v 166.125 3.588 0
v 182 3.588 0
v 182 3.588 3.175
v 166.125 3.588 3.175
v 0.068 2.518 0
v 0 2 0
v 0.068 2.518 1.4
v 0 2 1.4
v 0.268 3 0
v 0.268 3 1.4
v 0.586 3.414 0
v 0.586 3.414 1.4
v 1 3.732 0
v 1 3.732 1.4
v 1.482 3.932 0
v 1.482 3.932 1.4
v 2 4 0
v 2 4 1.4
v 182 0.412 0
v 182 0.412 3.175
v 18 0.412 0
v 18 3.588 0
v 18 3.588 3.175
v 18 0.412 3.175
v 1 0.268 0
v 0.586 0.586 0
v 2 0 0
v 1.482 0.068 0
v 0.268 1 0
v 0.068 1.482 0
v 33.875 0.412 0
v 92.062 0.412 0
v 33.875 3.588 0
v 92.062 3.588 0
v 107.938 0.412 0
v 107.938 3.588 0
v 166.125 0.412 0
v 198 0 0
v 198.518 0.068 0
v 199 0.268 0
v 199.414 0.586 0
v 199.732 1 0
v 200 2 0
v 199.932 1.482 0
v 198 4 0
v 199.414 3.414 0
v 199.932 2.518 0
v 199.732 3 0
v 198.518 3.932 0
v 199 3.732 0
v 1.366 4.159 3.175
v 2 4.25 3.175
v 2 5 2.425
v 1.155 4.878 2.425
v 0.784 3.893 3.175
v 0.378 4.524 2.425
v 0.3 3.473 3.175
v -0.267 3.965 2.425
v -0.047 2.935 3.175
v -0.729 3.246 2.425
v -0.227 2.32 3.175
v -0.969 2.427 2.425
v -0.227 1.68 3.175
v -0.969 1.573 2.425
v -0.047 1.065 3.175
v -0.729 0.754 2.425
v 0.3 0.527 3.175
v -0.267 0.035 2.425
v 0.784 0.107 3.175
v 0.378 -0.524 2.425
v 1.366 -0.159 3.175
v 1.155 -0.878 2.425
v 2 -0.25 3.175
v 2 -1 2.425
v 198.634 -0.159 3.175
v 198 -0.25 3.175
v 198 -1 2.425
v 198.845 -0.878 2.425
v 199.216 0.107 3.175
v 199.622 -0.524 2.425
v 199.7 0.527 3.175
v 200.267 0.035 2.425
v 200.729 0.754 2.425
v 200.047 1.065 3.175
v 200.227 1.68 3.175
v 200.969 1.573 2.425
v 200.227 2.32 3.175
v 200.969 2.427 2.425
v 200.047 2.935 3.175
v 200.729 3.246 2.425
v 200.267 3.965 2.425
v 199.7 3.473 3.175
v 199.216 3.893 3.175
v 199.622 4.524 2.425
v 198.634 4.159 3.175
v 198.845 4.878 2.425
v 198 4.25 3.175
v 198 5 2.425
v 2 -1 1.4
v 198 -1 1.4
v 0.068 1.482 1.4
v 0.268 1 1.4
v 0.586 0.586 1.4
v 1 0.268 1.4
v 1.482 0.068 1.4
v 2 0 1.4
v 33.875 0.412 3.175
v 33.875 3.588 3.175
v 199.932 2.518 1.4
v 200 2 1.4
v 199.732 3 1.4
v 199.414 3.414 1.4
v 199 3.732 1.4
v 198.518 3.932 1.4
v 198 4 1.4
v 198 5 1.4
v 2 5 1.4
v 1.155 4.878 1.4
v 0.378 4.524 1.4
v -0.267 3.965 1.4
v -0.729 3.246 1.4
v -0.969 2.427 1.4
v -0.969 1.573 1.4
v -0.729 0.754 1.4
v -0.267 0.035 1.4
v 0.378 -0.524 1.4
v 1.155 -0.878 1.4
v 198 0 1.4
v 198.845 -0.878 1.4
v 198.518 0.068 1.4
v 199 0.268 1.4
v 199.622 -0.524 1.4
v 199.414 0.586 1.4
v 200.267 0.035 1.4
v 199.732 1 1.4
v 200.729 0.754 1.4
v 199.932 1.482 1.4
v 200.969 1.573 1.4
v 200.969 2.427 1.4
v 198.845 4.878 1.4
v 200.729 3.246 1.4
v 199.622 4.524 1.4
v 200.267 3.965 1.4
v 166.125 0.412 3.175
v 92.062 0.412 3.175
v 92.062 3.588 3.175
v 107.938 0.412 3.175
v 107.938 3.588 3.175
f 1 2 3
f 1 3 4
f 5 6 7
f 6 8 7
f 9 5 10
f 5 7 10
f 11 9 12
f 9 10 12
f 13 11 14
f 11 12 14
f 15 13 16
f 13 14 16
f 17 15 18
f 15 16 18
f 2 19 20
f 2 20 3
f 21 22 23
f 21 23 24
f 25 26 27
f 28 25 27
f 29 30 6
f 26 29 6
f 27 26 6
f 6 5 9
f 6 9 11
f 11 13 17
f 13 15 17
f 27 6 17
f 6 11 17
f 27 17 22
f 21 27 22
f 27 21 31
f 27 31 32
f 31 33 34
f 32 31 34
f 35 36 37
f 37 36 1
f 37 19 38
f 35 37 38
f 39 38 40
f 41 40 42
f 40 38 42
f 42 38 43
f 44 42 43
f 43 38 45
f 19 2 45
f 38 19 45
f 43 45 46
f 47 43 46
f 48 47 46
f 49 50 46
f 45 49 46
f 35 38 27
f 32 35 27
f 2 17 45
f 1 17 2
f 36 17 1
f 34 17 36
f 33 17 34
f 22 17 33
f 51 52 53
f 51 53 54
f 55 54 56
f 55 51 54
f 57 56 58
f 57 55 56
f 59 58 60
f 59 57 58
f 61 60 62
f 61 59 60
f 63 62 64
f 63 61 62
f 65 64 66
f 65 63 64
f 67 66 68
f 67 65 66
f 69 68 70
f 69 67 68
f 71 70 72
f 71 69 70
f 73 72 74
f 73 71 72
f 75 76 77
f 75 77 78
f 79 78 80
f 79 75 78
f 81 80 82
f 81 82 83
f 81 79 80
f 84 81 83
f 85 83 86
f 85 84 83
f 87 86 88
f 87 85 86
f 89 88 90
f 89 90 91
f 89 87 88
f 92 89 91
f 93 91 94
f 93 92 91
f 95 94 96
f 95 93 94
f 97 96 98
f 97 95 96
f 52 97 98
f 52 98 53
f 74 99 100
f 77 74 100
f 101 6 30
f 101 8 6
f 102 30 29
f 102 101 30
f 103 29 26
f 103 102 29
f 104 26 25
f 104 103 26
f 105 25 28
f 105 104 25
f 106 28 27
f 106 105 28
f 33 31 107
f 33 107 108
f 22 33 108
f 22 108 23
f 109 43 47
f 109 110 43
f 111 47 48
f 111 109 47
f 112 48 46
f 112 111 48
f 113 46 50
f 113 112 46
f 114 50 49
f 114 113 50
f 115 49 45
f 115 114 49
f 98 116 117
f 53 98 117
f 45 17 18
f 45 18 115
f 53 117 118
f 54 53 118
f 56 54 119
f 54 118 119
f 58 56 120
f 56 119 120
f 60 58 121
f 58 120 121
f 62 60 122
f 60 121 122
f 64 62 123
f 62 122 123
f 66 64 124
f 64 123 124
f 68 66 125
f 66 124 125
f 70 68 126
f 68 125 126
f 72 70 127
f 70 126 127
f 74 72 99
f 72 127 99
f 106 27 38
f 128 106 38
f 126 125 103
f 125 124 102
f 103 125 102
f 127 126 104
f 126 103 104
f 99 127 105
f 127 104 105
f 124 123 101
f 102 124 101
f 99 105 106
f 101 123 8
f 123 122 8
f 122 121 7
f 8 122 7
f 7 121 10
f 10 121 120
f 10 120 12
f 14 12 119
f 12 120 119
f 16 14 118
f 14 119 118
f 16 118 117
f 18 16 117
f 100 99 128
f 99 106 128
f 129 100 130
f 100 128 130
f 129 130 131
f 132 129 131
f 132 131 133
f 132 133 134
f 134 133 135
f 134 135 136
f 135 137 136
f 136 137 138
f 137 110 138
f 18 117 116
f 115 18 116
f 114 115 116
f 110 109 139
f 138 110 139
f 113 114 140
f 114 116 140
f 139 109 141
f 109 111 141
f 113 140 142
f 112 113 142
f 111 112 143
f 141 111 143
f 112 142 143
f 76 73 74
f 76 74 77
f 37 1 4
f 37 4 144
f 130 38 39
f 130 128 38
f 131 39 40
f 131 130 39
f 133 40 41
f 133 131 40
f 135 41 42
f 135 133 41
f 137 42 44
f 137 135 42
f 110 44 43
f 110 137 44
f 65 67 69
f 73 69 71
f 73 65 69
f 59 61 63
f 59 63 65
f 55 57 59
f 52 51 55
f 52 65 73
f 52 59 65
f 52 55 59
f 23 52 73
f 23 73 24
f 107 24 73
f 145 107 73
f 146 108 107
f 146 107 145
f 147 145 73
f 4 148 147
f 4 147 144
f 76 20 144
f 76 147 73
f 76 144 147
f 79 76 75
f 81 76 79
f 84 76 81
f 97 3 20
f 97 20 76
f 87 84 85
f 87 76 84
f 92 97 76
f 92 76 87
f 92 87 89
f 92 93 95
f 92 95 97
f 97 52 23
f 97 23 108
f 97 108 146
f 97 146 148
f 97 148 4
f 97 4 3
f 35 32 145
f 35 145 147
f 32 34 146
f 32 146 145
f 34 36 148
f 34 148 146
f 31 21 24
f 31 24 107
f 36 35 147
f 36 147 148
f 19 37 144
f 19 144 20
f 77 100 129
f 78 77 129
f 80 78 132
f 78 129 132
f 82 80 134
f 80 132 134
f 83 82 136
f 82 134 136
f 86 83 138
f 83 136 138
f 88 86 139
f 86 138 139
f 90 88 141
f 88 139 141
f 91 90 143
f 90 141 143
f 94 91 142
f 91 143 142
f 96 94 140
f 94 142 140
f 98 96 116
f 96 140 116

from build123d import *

# Parameters (mm, degrees)
F0_W          = 200
F0_H          = 4
F1_DEPTH      = 1.4
F2_R          = 1.99999
F5_DEPTH      = 1.775
F6_SIZE       = 0.75
F7_DEPTH      = 1.4
F7_DEPTH_BACK = 25


# Not quite as in the source:
# - a fillet or chamfer is up to 0.001 mm smaller than in the source, because OpenCascade refuses the exact size


with BuildPart() as f1:
    # F0 (on Top) → F1 (new body)
    with BuildSketch(Plane.XY):
        with Locations((100, 2)):
            Rectangle(F0_W, F0_H)
    extrude(amount=F1_DEPTH)

    # F2 (radius 2 in the source; OpenCascade refuses exactly that, so slightly less here)
    f2_edges = [f1.edges().sort_by_distance(p)[0] for p in [
        (0, 0, 0.7),
        (0, 4, 0.7),
        (200, 0, 0.7),
        (200, 4, 0.7),
    ]]
    fillet(f2_edges, radius=F2_R)

    # F4 (on face) → F5 (join)
    with BuildSketch(Plane.XY.offset(1.4)):
        with BuildLine():
            Line((198, 5), (2, 5))
            ThreePointArc((2, 5), (-1, 2), (2, -1))
            Line((2, -1), (198, -1))
            ThreePointArc((198, -1), (201, 2), (198, 5))
        make_face()
    extrude(amount=F5_DEPTH)

    # F6
    f6_edges = [f1.edges().sort_by_distance(p)[0] for p in [
        (-1, 2, 3.175),
    ]]
    chamfer(f6_edges, length=F6_SIZE)

    # F3 (on face) → F7 (cut, two sides)
    with BuildSketch(Plane.XY.offset(1.4)) as f7_sk:
        Polygon((18, 3.5875), (18, 2), (18, 0.4125), (33.875, 0.4125), (33.875, 3.5875), align=None)
        Polygon((182, 0.4125), (182, 2), (182, 3.5875), (166.125, 3.5875), (166.125, 0.4125), align=None)
        Polygon((92.0625, 3.5875), (92.0625, 2), (92.0625, 0.4125), (107.9375, 0.4125), (107.9375, 3.5875), align=None)
    extrude(amount=-F7_DEPTH, mode=Mode.SUBTRACT)
    extrude(f7_sk.sketch, amount=F7_DEPTH_BACK, mode=Mode.SUBTRACT)


solid = f1.part
